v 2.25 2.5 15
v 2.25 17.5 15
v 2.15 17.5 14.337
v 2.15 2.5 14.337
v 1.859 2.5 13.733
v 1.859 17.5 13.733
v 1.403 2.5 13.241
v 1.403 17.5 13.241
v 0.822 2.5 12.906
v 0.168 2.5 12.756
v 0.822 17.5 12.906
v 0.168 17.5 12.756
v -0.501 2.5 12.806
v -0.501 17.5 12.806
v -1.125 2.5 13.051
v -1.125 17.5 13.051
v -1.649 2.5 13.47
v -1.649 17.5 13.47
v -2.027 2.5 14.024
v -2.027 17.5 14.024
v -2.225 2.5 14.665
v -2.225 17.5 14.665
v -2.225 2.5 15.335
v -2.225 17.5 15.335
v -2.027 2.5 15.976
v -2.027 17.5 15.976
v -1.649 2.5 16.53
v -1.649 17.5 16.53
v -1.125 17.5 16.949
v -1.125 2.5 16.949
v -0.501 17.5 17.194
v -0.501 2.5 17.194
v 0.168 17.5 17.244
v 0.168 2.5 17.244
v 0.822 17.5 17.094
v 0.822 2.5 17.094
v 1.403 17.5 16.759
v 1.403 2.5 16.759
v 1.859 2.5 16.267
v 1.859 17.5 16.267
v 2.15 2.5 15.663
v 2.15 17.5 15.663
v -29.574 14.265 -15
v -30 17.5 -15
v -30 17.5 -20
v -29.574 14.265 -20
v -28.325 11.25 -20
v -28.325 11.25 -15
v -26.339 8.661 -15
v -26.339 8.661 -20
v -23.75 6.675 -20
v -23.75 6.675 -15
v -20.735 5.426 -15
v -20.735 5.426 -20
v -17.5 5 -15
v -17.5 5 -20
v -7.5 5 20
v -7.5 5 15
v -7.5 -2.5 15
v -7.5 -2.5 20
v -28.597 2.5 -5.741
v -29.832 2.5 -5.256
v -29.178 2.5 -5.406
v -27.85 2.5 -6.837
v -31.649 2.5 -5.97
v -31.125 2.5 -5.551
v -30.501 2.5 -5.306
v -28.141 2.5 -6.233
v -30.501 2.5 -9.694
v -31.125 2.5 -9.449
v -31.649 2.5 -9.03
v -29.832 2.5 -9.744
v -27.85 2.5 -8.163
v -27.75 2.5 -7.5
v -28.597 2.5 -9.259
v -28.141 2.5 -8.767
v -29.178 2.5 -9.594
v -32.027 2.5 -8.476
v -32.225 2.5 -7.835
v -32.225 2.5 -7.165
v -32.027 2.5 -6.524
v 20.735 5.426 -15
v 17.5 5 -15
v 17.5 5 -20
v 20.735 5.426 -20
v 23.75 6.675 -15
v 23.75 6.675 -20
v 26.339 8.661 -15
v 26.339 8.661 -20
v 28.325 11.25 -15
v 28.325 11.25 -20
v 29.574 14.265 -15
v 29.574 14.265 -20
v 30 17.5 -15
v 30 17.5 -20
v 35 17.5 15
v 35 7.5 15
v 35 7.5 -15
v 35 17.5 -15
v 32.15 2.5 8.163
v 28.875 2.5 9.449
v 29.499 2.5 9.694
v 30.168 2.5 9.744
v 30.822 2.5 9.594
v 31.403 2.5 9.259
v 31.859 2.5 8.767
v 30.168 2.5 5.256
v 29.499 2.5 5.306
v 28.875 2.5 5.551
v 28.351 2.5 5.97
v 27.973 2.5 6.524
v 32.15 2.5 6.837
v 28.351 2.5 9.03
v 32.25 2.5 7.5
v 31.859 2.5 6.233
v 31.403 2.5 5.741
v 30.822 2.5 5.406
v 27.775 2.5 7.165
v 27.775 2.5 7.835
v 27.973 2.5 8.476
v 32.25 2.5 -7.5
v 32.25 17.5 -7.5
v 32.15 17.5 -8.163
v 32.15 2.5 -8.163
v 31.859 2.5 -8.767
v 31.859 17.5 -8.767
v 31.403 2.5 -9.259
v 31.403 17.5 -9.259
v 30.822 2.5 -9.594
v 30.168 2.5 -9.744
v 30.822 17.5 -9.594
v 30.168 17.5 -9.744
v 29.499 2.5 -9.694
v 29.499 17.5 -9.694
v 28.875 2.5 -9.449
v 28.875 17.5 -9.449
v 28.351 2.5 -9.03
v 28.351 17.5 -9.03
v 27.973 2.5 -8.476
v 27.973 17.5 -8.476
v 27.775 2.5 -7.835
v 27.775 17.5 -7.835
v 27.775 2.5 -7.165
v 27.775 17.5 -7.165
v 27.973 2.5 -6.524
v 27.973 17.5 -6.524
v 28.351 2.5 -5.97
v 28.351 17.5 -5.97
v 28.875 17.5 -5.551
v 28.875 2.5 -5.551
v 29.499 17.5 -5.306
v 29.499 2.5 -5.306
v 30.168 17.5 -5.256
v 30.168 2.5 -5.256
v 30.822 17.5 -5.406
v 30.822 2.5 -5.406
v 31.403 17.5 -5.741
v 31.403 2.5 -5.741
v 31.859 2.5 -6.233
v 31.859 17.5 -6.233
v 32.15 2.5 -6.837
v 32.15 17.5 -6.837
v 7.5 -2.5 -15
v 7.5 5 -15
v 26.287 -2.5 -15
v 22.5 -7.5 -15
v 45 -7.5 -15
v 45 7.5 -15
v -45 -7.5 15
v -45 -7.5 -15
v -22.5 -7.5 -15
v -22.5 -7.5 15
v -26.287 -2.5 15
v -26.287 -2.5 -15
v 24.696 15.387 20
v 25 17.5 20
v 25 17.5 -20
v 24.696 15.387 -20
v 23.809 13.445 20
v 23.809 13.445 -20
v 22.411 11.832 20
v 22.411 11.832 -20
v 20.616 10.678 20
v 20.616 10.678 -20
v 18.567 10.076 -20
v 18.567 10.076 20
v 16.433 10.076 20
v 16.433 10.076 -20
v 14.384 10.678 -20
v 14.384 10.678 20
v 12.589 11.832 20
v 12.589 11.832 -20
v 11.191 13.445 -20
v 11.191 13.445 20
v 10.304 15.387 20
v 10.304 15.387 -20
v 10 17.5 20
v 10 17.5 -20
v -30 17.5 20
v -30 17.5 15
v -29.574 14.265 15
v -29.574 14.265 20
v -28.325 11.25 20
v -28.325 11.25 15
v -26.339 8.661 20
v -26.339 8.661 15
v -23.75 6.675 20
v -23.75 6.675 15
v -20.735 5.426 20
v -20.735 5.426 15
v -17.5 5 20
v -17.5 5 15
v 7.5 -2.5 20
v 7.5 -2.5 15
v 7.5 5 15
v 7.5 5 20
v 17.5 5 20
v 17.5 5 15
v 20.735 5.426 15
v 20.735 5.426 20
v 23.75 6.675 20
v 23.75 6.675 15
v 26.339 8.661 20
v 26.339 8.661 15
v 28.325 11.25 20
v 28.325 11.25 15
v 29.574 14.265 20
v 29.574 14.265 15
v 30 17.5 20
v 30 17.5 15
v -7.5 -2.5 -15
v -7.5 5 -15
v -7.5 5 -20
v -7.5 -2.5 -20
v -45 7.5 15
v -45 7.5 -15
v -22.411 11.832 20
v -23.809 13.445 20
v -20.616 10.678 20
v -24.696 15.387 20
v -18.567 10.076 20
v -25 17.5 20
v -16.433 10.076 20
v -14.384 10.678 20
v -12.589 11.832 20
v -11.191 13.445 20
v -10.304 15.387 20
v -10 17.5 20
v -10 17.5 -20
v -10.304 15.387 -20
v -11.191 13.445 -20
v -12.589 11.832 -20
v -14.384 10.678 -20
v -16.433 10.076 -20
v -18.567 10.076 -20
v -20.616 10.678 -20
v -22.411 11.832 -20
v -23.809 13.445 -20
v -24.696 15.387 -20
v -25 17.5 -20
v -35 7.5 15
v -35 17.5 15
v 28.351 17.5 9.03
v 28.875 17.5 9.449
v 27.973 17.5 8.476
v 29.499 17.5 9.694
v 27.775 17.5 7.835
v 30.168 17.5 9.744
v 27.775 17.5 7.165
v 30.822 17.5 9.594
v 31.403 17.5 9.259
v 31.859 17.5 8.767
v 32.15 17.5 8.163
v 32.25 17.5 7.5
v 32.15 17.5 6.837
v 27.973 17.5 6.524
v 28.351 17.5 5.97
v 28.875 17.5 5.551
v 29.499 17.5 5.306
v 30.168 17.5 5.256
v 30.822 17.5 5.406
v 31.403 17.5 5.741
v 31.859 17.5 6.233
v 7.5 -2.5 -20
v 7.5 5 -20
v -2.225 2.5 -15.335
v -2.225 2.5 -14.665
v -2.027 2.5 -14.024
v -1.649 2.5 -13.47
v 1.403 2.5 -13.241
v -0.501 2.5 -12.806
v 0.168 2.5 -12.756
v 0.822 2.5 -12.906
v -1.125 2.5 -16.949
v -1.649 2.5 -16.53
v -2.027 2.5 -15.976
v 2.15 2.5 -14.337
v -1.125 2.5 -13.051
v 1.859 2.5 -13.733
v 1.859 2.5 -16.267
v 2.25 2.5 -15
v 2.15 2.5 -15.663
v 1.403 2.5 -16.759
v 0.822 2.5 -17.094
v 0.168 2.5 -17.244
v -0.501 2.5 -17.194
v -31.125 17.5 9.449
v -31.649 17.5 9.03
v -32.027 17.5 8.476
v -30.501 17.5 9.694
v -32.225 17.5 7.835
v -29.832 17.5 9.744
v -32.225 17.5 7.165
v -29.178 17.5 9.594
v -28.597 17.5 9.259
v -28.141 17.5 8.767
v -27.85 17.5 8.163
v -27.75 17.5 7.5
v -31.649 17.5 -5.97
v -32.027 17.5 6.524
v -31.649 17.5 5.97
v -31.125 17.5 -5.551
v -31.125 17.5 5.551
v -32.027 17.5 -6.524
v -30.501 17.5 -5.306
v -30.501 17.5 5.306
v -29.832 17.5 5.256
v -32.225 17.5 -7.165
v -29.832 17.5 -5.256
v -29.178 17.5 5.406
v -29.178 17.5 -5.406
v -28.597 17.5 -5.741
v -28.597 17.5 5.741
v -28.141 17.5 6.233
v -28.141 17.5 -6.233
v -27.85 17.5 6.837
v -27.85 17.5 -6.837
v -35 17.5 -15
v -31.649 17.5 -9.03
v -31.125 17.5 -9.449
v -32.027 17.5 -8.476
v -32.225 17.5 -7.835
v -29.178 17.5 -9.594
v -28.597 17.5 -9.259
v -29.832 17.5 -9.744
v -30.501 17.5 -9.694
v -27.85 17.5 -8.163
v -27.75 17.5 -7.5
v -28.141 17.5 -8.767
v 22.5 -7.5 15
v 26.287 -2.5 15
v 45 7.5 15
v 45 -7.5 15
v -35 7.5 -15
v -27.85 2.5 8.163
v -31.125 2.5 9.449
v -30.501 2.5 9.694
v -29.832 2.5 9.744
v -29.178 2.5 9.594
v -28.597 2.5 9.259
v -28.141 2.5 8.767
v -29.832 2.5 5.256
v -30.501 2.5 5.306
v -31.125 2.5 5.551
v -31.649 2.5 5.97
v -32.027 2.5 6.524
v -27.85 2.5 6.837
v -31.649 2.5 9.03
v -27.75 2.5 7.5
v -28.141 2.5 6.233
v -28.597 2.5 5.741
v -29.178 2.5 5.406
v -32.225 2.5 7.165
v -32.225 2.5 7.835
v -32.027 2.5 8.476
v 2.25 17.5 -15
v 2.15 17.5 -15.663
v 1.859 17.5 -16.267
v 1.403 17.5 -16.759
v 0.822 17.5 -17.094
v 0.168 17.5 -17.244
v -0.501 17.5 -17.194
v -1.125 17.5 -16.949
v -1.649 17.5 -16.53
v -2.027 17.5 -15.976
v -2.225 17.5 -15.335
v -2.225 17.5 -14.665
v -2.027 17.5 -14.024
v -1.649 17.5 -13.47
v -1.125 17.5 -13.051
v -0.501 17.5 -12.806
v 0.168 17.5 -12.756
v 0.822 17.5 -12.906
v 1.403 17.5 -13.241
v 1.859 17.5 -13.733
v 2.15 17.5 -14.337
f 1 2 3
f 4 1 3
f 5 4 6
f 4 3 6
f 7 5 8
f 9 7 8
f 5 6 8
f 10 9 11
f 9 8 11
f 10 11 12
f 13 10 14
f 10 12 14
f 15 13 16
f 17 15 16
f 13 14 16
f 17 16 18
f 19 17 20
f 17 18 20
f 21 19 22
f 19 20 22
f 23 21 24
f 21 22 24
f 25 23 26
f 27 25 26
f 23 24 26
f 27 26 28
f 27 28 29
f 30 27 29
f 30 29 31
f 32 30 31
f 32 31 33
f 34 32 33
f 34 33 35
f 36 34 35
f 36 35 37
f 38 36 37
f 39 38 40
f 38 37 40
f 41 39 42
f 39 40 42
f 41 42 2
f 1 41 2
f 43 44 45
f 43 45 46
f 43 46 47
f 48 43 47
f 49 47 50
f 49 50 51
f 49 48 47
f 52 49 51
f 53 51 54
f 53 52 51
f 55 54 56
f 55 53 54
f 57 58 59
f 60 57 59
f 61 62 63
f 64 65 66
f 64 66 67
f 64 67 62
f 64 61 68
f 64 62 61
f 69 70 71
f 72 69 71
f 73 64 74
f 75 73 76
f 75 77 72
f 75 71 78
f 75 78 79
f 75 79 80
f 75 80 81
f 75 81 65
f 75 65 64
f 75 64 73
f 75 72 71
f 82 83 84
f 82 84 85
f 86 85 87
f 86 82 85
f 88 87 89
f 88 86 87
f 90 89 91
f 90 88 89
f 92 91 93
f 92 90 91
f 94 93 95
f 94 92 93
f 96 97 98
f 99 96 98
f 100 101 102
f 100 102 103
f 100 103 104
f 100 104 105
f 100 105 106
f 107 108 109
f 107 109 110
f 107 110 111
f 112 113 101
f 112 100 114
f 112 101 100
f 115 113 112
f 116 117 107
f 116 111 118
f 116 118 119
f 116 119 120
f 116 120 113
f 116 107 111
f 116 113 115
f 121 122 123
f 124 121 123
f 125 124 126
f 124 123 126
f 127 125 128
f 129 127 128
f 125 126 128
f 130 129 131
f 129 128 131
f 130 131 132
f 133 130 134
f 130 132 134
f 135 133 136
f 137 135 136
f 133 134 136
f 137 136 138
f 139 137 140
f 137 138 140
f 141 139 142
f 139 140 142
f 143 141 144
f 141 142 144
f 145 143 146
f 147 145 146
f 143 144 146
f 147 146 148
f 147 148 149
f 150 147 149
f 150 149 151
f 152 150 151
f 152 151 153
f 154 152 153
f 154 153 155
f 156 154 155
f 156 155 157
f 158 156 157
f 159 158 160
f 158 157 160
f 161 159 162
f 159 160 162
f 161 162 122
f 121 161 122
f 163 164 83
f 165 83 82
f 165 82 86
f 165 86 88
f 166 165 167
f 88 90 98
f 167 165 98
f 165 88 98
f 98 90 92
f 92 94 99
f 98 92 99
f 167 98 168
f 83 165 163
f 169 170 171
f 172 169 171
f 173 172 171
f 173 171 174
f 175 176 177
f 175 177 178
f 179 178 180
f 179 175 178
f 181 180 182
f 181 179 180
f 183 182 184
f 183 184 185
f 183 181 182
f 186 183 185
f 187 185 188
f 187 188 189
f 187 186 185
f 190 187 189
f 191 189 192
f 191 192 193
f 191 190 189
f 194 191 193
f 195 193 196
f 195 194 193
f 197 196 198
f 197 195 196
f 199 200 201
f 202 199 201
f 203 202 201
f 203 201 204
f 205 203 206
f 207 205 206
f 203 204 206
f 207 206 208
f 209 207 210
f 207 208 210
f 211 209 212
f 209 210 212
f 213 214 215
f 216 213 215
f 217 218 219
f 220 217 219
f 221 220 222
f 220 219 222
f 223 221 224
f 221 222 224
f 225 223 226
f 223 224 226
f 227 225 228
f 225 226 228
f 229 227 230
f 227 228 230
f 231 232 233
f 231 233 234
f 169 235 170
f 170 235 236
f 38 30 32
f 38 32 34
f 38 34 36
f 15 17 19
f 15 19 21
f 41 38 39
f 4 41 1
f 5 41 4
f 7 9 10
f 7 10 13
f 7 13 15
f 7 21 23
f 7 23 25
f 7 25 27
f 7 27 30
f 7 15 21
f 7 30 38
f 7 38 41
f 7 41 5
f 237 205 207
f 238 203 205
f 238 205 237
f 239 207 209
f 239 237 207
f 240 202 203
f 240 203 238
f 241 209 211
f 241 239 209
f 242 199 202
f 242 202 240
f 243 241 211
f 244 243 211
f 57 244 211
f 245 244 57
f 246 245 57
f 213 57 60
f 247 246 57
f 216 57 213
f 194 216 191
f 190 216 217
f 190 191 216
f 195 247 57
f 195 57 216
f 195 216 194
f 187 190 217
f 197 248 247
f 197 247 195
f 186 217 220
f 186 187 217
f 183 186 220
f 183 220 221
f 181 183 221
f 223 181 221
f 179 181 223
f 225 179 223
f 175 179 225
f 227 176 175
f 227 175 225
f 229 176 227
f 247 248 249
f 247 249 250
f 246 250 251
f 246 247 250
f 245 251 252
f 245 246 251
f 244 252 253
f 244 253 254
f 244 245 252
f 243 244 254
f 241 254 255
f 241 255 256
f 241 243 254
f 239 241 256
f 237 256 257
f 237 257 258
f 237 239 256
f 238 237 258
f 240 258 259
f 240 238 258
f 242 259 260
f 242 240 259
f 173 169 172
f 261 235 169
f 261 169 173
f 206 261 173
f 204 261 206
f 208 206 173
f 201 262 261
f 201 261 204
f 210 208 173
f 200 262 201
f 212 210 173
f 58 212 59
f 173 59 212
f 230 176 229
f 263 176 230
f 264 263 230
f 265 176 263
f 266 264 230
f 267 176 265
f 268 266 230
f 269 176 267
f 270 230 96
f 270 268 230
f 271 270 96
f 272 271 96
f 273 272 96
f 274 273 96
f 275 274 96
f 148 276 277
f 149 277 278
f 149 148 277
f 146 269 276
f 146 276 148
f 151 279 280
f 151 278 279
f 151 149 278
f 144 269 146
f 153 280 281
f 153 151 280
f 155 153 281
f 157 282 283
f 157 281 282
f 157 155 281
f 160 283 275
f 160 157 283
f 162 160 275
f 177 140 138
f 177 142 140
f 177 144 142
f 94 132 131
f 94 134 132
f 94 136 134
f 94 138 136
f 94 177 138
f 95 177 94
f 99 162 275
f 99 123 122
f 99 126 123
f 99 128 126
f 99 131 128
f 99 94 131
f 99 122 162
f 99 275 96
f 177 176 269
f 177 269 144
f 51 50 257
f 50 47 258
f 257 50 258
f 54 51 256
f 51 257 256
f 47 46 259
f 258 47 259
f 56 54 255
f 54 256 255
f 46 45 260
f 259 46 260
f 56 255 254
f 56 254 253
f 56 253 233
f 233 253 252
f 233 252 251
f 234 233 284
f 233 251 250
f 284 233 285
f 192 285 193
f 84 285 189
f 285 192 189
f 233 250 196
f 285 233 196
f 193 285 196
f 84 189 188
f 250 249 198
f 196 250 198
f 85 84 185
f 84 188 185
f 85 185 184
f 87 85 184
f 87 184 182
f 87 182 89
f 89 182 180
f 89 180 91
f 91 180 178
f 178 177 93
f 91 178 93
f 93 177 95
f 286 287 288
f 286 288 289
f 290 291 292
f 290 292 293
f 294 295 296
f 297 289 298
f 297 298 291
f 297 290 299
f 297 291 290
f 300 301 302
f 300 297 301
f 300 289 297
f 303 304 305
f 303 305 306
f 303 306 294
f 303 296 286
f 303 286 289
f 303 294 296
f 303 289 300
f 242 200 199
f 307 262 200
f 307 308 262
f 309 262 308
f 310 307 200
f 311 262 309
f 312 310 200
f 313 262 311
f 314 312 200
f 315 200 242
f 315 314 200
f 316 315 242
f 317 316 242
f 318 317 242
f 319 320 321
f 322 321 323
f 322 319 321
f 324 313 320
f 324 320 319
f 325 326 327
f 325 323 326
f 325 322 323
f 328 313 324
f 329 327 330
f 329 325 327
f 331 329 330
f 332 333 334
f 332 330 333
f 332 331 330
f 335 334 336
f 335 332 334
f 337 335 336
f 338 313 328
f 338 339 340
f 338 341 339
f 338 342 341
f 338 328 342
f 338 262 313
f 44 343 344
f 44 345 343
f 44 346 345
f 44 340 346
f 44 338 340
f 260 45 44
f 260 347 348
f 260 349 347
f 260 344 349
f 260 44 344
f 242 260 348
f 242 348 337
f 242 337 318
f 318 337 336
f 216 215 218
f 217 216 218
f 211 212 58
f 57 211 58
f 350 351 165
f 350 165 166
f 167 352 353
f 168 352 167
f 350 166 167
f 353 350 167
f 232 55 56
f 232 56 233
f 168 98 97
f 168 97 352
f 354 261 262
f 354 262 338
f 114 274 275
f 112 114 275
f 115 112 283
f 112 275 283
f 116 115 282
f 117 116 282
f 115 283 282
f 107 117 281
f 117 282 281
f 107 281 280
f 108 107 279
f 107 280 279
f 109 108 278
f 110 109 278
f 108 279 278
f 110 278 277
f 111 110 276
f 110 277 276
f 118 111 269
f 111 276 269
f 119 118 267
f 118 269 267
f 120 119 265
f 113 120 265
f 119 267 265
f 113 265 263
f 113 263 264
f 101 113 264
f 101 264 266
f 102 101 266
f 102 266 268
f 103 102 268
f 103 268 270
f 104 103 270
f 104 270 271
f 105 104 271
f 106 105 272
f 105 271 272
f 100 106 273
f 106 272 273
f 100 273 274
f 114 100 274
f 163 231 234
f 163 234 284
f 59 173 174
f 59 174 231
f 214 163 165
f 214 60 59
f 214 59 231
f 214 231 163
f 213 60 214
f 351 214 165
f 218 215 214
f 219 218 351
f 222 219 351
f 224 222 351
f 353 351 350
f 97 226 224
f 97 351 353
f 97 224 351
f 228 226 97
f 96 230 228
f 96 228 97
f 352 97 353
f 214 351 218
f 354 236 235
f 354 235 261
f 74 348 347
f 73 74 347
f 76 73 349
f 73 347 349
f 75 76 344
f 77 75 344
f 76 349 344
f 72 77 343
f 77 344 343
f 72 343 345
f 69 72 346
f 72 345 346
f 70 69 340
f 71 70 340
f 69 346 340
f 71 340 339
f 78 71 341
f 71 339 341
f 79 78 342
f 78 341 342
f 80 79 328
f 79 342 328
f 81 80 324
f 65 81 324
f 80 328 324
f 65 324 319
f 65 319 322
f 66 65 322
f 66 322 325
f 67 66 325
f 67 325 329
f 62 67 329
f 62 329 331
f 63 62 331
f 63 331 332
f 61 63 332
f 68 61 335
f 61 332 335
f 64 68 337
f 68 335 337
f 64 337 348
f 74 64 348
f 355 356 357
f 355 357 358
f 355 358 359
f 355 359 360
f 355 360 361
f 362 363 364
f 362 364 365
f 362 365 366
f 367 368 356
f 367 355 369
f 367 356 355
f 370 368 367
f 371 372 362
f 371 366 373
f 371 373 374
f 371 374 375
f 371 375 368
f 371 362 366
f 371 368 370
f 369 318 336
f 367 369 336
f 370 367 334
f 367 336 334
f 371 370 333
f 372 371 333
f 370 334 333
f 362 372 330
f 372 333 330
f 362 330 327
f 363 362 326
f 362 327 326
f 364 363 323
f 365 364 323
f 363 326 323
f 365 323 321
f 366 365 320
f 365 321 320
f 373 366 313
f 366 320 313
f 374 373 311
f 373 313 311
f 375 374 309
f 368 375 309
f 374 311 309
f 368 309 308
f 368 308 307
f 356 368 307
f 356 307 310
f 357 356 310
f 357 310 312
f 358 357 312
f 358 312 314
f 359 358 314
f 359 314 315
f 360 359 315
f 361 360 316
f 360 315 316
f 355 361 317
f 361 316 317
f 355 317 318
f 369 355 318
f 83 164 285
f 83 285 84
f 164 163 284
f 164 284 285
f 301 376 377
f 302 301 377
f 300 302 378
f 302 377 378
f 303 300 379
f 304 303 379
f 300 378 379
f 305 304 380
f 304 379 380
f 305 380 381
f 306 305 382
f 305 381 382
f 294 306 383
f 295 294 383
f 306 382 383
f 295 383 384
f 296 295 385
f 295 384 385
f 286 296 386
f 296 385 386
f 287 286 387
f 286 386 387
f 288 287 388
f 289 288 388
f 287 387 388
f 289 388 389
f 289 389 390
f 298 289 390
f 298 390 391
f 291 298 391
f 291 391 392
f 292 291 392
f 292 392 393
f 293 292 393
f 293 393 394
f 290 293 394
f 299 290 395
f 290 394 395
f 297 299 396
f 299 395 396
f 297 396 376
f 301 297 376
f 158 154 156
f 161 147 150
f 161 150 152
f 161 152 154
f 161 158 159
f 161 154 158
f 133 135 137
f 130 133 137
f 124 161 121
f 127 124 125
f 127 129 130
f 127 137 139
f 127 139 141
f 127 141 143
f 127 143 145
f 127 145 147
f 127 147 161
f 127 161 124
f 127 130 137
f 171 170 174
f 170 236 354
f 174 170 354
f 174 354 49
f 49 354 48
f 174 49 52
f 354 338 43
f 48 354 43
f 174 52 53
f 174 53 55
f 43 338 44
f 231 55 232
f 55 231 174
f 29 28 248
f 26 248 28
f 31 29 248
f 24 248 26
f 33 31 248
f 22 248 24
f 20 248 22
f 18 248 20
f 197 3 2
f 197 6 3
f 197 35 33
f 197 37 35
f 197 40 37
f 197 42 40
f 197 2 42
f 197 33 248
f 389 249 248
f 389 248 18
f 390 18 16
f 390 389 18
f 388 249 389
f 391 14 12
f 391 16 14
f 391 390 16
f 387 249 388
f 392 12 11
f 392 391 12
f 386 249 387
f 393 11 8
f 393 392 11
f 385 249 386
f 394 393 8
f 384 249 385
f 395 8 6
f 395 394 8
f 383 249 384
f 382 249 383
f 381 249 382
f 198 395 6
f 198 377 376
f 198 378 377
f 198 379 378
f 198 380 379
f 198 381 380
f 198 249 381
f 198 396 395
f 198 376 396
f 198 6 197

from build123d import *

# Parameters (mm, degrees)
SKETCH1_W                = 90
SKETCH1_H                = 30
BOSS_EXTRUDE1_DEPTH      = 7.5
SKETCH2_W                = 70
SKETCH2_H                = 30
BOSS_EXTRUDE2_DEPTH      = 10
CUT_EXTRUDE1_DEPTH       = 31
BOSS_EXTRUDE3_DEPTH      = 5
BOSS_EXTRUDE3_DEPTH_BACK = 35
CUT_EXTRUDE2_DEPTH       = 30
SKETCH7_R                = 2.25
CUT_EXTRUDE3_DEPTH       = 15


with BuildPart() as part:
    # Sketch1 → Boss-Extrude1 (new body, symmetric)
    with BuildSketch(Plane(origin=(0, 0, 0), x_dir=(1, 0, 0), z_dir=(0, 1, 0))):
        Rectangle(SKETCH1_W, SKETCH1_H)
    extrude(amount=BOSS_EXTRUDE1_DEPTH, both=True)

    # Sketch2 → Boss-Extrude2 (add)
    with BuildSketch(Plane(origin=(0, 7.5, 0), x_dir=(1, 0, 0), z_dir=(0, 1, 0))):
        Rectangle(SKETCH2_W, SKETCH2_H)
    extrude(amount=BOSS_EXTRUDE2_DEPTH)

    # Sketch3 → Cut-Extrude1 (cut, through all)
    with BuildSketch(Plane.XY.offset(15)):
        Polygon((-26.286782916, -2.5), (26.286782916, -2.5), (22.5, -7.5), (-22.5, -7.5), align=None)
    extrude(amount=-CUT_EXTRUDE1_DEPTH, mode=Mode.SUBTRACT)

    # Sketch4 → Boss-Extrude3 (add, two sides)
    with BuildSketch(Plane.XY.offset(15)) as boss_extrude3_sk:
        with BuildLine():
            Line((-7.5, 5), (-7.5, -2.5))
            Line((-7.5, -2.5), (7.5, -2.5))
            Line((7.5, -2.5), (7.5, 5))
            Line((7.5, 5), (17.5, 5))
            ThreePointArc((17.5, 5), (26.338834765, 8.661165235), (30, 17.5))
            Line((30, 17.5), (25, 17.5))
            ThreePointArc((25, 17.5), (17.5, 10), (10, 17.5))
            Line((10, 17.5), (-10, 17.5))
            ThreePointArc((-10, 17.5), (-17.5, 10), (-25, 17.5))
            Line((-25, 17.5), (-30, 17.5))
            ThreePointArc((-30, 17.5), (-26.338834765, 8.661165235), (-17.5, 5))
            Line((-17.5, 5), (-7.5, 5))
        make_face()
    extrude(amount=BOSS_EXTRUDE3_DEPTH)
    extrude(boss_extrude3_sk.sketch, amount=-BOSS_EXTRUDE3_DEPTH_BACK)

    # Sketch6 → Cut-Extrude2 (cut)
    with BuildSketch(Plane.XY.offset(15)):
        with BuildLine():
            Line((-25, 17.5), (-10, 17.5))
            ThreePointArc((-10, 17.5), (-17.5, 10), (-25, 17.5))
        make_face()
        with BuildLine():
            Line((10, 17.5), (25, 17.5))
            ThreePointArc((25, 17.5), (17.5, 10), (10, 17.5))
        make_face()
    extrude(amount=-CUT_EXTRUDE2_DEPTH, mode=Mode.SUBTRACT)

    # Sketch7 → Cut-Extrude3 (cut)
    with BuildSketch(Plane(origin=(0, 17.5, 0), x_dir=(1, 0, 0), z_dir=(0, 1, 0))):
        with Locations((0, 15)):
            Circle(SKETCH7_R)
        with Locations((0, -15)):
            Circle(SKETCH7_R)
        with Locations((-30, 7.5)):
            Circle(SKETCH7_R)
        with Locations((-30, -7.5)):
            Circle(SKETCH7_R)
        with Locations((30, -7.5)):
            Circle(SKETCH7_R)
        with Locations((30, 7.5)):
            Circle(SKETCH7_R)
    extrude(amount=-CUT_EXTRUDE3_DEPTH, mode=Mode.SUBTRACT)


solid = part.part
